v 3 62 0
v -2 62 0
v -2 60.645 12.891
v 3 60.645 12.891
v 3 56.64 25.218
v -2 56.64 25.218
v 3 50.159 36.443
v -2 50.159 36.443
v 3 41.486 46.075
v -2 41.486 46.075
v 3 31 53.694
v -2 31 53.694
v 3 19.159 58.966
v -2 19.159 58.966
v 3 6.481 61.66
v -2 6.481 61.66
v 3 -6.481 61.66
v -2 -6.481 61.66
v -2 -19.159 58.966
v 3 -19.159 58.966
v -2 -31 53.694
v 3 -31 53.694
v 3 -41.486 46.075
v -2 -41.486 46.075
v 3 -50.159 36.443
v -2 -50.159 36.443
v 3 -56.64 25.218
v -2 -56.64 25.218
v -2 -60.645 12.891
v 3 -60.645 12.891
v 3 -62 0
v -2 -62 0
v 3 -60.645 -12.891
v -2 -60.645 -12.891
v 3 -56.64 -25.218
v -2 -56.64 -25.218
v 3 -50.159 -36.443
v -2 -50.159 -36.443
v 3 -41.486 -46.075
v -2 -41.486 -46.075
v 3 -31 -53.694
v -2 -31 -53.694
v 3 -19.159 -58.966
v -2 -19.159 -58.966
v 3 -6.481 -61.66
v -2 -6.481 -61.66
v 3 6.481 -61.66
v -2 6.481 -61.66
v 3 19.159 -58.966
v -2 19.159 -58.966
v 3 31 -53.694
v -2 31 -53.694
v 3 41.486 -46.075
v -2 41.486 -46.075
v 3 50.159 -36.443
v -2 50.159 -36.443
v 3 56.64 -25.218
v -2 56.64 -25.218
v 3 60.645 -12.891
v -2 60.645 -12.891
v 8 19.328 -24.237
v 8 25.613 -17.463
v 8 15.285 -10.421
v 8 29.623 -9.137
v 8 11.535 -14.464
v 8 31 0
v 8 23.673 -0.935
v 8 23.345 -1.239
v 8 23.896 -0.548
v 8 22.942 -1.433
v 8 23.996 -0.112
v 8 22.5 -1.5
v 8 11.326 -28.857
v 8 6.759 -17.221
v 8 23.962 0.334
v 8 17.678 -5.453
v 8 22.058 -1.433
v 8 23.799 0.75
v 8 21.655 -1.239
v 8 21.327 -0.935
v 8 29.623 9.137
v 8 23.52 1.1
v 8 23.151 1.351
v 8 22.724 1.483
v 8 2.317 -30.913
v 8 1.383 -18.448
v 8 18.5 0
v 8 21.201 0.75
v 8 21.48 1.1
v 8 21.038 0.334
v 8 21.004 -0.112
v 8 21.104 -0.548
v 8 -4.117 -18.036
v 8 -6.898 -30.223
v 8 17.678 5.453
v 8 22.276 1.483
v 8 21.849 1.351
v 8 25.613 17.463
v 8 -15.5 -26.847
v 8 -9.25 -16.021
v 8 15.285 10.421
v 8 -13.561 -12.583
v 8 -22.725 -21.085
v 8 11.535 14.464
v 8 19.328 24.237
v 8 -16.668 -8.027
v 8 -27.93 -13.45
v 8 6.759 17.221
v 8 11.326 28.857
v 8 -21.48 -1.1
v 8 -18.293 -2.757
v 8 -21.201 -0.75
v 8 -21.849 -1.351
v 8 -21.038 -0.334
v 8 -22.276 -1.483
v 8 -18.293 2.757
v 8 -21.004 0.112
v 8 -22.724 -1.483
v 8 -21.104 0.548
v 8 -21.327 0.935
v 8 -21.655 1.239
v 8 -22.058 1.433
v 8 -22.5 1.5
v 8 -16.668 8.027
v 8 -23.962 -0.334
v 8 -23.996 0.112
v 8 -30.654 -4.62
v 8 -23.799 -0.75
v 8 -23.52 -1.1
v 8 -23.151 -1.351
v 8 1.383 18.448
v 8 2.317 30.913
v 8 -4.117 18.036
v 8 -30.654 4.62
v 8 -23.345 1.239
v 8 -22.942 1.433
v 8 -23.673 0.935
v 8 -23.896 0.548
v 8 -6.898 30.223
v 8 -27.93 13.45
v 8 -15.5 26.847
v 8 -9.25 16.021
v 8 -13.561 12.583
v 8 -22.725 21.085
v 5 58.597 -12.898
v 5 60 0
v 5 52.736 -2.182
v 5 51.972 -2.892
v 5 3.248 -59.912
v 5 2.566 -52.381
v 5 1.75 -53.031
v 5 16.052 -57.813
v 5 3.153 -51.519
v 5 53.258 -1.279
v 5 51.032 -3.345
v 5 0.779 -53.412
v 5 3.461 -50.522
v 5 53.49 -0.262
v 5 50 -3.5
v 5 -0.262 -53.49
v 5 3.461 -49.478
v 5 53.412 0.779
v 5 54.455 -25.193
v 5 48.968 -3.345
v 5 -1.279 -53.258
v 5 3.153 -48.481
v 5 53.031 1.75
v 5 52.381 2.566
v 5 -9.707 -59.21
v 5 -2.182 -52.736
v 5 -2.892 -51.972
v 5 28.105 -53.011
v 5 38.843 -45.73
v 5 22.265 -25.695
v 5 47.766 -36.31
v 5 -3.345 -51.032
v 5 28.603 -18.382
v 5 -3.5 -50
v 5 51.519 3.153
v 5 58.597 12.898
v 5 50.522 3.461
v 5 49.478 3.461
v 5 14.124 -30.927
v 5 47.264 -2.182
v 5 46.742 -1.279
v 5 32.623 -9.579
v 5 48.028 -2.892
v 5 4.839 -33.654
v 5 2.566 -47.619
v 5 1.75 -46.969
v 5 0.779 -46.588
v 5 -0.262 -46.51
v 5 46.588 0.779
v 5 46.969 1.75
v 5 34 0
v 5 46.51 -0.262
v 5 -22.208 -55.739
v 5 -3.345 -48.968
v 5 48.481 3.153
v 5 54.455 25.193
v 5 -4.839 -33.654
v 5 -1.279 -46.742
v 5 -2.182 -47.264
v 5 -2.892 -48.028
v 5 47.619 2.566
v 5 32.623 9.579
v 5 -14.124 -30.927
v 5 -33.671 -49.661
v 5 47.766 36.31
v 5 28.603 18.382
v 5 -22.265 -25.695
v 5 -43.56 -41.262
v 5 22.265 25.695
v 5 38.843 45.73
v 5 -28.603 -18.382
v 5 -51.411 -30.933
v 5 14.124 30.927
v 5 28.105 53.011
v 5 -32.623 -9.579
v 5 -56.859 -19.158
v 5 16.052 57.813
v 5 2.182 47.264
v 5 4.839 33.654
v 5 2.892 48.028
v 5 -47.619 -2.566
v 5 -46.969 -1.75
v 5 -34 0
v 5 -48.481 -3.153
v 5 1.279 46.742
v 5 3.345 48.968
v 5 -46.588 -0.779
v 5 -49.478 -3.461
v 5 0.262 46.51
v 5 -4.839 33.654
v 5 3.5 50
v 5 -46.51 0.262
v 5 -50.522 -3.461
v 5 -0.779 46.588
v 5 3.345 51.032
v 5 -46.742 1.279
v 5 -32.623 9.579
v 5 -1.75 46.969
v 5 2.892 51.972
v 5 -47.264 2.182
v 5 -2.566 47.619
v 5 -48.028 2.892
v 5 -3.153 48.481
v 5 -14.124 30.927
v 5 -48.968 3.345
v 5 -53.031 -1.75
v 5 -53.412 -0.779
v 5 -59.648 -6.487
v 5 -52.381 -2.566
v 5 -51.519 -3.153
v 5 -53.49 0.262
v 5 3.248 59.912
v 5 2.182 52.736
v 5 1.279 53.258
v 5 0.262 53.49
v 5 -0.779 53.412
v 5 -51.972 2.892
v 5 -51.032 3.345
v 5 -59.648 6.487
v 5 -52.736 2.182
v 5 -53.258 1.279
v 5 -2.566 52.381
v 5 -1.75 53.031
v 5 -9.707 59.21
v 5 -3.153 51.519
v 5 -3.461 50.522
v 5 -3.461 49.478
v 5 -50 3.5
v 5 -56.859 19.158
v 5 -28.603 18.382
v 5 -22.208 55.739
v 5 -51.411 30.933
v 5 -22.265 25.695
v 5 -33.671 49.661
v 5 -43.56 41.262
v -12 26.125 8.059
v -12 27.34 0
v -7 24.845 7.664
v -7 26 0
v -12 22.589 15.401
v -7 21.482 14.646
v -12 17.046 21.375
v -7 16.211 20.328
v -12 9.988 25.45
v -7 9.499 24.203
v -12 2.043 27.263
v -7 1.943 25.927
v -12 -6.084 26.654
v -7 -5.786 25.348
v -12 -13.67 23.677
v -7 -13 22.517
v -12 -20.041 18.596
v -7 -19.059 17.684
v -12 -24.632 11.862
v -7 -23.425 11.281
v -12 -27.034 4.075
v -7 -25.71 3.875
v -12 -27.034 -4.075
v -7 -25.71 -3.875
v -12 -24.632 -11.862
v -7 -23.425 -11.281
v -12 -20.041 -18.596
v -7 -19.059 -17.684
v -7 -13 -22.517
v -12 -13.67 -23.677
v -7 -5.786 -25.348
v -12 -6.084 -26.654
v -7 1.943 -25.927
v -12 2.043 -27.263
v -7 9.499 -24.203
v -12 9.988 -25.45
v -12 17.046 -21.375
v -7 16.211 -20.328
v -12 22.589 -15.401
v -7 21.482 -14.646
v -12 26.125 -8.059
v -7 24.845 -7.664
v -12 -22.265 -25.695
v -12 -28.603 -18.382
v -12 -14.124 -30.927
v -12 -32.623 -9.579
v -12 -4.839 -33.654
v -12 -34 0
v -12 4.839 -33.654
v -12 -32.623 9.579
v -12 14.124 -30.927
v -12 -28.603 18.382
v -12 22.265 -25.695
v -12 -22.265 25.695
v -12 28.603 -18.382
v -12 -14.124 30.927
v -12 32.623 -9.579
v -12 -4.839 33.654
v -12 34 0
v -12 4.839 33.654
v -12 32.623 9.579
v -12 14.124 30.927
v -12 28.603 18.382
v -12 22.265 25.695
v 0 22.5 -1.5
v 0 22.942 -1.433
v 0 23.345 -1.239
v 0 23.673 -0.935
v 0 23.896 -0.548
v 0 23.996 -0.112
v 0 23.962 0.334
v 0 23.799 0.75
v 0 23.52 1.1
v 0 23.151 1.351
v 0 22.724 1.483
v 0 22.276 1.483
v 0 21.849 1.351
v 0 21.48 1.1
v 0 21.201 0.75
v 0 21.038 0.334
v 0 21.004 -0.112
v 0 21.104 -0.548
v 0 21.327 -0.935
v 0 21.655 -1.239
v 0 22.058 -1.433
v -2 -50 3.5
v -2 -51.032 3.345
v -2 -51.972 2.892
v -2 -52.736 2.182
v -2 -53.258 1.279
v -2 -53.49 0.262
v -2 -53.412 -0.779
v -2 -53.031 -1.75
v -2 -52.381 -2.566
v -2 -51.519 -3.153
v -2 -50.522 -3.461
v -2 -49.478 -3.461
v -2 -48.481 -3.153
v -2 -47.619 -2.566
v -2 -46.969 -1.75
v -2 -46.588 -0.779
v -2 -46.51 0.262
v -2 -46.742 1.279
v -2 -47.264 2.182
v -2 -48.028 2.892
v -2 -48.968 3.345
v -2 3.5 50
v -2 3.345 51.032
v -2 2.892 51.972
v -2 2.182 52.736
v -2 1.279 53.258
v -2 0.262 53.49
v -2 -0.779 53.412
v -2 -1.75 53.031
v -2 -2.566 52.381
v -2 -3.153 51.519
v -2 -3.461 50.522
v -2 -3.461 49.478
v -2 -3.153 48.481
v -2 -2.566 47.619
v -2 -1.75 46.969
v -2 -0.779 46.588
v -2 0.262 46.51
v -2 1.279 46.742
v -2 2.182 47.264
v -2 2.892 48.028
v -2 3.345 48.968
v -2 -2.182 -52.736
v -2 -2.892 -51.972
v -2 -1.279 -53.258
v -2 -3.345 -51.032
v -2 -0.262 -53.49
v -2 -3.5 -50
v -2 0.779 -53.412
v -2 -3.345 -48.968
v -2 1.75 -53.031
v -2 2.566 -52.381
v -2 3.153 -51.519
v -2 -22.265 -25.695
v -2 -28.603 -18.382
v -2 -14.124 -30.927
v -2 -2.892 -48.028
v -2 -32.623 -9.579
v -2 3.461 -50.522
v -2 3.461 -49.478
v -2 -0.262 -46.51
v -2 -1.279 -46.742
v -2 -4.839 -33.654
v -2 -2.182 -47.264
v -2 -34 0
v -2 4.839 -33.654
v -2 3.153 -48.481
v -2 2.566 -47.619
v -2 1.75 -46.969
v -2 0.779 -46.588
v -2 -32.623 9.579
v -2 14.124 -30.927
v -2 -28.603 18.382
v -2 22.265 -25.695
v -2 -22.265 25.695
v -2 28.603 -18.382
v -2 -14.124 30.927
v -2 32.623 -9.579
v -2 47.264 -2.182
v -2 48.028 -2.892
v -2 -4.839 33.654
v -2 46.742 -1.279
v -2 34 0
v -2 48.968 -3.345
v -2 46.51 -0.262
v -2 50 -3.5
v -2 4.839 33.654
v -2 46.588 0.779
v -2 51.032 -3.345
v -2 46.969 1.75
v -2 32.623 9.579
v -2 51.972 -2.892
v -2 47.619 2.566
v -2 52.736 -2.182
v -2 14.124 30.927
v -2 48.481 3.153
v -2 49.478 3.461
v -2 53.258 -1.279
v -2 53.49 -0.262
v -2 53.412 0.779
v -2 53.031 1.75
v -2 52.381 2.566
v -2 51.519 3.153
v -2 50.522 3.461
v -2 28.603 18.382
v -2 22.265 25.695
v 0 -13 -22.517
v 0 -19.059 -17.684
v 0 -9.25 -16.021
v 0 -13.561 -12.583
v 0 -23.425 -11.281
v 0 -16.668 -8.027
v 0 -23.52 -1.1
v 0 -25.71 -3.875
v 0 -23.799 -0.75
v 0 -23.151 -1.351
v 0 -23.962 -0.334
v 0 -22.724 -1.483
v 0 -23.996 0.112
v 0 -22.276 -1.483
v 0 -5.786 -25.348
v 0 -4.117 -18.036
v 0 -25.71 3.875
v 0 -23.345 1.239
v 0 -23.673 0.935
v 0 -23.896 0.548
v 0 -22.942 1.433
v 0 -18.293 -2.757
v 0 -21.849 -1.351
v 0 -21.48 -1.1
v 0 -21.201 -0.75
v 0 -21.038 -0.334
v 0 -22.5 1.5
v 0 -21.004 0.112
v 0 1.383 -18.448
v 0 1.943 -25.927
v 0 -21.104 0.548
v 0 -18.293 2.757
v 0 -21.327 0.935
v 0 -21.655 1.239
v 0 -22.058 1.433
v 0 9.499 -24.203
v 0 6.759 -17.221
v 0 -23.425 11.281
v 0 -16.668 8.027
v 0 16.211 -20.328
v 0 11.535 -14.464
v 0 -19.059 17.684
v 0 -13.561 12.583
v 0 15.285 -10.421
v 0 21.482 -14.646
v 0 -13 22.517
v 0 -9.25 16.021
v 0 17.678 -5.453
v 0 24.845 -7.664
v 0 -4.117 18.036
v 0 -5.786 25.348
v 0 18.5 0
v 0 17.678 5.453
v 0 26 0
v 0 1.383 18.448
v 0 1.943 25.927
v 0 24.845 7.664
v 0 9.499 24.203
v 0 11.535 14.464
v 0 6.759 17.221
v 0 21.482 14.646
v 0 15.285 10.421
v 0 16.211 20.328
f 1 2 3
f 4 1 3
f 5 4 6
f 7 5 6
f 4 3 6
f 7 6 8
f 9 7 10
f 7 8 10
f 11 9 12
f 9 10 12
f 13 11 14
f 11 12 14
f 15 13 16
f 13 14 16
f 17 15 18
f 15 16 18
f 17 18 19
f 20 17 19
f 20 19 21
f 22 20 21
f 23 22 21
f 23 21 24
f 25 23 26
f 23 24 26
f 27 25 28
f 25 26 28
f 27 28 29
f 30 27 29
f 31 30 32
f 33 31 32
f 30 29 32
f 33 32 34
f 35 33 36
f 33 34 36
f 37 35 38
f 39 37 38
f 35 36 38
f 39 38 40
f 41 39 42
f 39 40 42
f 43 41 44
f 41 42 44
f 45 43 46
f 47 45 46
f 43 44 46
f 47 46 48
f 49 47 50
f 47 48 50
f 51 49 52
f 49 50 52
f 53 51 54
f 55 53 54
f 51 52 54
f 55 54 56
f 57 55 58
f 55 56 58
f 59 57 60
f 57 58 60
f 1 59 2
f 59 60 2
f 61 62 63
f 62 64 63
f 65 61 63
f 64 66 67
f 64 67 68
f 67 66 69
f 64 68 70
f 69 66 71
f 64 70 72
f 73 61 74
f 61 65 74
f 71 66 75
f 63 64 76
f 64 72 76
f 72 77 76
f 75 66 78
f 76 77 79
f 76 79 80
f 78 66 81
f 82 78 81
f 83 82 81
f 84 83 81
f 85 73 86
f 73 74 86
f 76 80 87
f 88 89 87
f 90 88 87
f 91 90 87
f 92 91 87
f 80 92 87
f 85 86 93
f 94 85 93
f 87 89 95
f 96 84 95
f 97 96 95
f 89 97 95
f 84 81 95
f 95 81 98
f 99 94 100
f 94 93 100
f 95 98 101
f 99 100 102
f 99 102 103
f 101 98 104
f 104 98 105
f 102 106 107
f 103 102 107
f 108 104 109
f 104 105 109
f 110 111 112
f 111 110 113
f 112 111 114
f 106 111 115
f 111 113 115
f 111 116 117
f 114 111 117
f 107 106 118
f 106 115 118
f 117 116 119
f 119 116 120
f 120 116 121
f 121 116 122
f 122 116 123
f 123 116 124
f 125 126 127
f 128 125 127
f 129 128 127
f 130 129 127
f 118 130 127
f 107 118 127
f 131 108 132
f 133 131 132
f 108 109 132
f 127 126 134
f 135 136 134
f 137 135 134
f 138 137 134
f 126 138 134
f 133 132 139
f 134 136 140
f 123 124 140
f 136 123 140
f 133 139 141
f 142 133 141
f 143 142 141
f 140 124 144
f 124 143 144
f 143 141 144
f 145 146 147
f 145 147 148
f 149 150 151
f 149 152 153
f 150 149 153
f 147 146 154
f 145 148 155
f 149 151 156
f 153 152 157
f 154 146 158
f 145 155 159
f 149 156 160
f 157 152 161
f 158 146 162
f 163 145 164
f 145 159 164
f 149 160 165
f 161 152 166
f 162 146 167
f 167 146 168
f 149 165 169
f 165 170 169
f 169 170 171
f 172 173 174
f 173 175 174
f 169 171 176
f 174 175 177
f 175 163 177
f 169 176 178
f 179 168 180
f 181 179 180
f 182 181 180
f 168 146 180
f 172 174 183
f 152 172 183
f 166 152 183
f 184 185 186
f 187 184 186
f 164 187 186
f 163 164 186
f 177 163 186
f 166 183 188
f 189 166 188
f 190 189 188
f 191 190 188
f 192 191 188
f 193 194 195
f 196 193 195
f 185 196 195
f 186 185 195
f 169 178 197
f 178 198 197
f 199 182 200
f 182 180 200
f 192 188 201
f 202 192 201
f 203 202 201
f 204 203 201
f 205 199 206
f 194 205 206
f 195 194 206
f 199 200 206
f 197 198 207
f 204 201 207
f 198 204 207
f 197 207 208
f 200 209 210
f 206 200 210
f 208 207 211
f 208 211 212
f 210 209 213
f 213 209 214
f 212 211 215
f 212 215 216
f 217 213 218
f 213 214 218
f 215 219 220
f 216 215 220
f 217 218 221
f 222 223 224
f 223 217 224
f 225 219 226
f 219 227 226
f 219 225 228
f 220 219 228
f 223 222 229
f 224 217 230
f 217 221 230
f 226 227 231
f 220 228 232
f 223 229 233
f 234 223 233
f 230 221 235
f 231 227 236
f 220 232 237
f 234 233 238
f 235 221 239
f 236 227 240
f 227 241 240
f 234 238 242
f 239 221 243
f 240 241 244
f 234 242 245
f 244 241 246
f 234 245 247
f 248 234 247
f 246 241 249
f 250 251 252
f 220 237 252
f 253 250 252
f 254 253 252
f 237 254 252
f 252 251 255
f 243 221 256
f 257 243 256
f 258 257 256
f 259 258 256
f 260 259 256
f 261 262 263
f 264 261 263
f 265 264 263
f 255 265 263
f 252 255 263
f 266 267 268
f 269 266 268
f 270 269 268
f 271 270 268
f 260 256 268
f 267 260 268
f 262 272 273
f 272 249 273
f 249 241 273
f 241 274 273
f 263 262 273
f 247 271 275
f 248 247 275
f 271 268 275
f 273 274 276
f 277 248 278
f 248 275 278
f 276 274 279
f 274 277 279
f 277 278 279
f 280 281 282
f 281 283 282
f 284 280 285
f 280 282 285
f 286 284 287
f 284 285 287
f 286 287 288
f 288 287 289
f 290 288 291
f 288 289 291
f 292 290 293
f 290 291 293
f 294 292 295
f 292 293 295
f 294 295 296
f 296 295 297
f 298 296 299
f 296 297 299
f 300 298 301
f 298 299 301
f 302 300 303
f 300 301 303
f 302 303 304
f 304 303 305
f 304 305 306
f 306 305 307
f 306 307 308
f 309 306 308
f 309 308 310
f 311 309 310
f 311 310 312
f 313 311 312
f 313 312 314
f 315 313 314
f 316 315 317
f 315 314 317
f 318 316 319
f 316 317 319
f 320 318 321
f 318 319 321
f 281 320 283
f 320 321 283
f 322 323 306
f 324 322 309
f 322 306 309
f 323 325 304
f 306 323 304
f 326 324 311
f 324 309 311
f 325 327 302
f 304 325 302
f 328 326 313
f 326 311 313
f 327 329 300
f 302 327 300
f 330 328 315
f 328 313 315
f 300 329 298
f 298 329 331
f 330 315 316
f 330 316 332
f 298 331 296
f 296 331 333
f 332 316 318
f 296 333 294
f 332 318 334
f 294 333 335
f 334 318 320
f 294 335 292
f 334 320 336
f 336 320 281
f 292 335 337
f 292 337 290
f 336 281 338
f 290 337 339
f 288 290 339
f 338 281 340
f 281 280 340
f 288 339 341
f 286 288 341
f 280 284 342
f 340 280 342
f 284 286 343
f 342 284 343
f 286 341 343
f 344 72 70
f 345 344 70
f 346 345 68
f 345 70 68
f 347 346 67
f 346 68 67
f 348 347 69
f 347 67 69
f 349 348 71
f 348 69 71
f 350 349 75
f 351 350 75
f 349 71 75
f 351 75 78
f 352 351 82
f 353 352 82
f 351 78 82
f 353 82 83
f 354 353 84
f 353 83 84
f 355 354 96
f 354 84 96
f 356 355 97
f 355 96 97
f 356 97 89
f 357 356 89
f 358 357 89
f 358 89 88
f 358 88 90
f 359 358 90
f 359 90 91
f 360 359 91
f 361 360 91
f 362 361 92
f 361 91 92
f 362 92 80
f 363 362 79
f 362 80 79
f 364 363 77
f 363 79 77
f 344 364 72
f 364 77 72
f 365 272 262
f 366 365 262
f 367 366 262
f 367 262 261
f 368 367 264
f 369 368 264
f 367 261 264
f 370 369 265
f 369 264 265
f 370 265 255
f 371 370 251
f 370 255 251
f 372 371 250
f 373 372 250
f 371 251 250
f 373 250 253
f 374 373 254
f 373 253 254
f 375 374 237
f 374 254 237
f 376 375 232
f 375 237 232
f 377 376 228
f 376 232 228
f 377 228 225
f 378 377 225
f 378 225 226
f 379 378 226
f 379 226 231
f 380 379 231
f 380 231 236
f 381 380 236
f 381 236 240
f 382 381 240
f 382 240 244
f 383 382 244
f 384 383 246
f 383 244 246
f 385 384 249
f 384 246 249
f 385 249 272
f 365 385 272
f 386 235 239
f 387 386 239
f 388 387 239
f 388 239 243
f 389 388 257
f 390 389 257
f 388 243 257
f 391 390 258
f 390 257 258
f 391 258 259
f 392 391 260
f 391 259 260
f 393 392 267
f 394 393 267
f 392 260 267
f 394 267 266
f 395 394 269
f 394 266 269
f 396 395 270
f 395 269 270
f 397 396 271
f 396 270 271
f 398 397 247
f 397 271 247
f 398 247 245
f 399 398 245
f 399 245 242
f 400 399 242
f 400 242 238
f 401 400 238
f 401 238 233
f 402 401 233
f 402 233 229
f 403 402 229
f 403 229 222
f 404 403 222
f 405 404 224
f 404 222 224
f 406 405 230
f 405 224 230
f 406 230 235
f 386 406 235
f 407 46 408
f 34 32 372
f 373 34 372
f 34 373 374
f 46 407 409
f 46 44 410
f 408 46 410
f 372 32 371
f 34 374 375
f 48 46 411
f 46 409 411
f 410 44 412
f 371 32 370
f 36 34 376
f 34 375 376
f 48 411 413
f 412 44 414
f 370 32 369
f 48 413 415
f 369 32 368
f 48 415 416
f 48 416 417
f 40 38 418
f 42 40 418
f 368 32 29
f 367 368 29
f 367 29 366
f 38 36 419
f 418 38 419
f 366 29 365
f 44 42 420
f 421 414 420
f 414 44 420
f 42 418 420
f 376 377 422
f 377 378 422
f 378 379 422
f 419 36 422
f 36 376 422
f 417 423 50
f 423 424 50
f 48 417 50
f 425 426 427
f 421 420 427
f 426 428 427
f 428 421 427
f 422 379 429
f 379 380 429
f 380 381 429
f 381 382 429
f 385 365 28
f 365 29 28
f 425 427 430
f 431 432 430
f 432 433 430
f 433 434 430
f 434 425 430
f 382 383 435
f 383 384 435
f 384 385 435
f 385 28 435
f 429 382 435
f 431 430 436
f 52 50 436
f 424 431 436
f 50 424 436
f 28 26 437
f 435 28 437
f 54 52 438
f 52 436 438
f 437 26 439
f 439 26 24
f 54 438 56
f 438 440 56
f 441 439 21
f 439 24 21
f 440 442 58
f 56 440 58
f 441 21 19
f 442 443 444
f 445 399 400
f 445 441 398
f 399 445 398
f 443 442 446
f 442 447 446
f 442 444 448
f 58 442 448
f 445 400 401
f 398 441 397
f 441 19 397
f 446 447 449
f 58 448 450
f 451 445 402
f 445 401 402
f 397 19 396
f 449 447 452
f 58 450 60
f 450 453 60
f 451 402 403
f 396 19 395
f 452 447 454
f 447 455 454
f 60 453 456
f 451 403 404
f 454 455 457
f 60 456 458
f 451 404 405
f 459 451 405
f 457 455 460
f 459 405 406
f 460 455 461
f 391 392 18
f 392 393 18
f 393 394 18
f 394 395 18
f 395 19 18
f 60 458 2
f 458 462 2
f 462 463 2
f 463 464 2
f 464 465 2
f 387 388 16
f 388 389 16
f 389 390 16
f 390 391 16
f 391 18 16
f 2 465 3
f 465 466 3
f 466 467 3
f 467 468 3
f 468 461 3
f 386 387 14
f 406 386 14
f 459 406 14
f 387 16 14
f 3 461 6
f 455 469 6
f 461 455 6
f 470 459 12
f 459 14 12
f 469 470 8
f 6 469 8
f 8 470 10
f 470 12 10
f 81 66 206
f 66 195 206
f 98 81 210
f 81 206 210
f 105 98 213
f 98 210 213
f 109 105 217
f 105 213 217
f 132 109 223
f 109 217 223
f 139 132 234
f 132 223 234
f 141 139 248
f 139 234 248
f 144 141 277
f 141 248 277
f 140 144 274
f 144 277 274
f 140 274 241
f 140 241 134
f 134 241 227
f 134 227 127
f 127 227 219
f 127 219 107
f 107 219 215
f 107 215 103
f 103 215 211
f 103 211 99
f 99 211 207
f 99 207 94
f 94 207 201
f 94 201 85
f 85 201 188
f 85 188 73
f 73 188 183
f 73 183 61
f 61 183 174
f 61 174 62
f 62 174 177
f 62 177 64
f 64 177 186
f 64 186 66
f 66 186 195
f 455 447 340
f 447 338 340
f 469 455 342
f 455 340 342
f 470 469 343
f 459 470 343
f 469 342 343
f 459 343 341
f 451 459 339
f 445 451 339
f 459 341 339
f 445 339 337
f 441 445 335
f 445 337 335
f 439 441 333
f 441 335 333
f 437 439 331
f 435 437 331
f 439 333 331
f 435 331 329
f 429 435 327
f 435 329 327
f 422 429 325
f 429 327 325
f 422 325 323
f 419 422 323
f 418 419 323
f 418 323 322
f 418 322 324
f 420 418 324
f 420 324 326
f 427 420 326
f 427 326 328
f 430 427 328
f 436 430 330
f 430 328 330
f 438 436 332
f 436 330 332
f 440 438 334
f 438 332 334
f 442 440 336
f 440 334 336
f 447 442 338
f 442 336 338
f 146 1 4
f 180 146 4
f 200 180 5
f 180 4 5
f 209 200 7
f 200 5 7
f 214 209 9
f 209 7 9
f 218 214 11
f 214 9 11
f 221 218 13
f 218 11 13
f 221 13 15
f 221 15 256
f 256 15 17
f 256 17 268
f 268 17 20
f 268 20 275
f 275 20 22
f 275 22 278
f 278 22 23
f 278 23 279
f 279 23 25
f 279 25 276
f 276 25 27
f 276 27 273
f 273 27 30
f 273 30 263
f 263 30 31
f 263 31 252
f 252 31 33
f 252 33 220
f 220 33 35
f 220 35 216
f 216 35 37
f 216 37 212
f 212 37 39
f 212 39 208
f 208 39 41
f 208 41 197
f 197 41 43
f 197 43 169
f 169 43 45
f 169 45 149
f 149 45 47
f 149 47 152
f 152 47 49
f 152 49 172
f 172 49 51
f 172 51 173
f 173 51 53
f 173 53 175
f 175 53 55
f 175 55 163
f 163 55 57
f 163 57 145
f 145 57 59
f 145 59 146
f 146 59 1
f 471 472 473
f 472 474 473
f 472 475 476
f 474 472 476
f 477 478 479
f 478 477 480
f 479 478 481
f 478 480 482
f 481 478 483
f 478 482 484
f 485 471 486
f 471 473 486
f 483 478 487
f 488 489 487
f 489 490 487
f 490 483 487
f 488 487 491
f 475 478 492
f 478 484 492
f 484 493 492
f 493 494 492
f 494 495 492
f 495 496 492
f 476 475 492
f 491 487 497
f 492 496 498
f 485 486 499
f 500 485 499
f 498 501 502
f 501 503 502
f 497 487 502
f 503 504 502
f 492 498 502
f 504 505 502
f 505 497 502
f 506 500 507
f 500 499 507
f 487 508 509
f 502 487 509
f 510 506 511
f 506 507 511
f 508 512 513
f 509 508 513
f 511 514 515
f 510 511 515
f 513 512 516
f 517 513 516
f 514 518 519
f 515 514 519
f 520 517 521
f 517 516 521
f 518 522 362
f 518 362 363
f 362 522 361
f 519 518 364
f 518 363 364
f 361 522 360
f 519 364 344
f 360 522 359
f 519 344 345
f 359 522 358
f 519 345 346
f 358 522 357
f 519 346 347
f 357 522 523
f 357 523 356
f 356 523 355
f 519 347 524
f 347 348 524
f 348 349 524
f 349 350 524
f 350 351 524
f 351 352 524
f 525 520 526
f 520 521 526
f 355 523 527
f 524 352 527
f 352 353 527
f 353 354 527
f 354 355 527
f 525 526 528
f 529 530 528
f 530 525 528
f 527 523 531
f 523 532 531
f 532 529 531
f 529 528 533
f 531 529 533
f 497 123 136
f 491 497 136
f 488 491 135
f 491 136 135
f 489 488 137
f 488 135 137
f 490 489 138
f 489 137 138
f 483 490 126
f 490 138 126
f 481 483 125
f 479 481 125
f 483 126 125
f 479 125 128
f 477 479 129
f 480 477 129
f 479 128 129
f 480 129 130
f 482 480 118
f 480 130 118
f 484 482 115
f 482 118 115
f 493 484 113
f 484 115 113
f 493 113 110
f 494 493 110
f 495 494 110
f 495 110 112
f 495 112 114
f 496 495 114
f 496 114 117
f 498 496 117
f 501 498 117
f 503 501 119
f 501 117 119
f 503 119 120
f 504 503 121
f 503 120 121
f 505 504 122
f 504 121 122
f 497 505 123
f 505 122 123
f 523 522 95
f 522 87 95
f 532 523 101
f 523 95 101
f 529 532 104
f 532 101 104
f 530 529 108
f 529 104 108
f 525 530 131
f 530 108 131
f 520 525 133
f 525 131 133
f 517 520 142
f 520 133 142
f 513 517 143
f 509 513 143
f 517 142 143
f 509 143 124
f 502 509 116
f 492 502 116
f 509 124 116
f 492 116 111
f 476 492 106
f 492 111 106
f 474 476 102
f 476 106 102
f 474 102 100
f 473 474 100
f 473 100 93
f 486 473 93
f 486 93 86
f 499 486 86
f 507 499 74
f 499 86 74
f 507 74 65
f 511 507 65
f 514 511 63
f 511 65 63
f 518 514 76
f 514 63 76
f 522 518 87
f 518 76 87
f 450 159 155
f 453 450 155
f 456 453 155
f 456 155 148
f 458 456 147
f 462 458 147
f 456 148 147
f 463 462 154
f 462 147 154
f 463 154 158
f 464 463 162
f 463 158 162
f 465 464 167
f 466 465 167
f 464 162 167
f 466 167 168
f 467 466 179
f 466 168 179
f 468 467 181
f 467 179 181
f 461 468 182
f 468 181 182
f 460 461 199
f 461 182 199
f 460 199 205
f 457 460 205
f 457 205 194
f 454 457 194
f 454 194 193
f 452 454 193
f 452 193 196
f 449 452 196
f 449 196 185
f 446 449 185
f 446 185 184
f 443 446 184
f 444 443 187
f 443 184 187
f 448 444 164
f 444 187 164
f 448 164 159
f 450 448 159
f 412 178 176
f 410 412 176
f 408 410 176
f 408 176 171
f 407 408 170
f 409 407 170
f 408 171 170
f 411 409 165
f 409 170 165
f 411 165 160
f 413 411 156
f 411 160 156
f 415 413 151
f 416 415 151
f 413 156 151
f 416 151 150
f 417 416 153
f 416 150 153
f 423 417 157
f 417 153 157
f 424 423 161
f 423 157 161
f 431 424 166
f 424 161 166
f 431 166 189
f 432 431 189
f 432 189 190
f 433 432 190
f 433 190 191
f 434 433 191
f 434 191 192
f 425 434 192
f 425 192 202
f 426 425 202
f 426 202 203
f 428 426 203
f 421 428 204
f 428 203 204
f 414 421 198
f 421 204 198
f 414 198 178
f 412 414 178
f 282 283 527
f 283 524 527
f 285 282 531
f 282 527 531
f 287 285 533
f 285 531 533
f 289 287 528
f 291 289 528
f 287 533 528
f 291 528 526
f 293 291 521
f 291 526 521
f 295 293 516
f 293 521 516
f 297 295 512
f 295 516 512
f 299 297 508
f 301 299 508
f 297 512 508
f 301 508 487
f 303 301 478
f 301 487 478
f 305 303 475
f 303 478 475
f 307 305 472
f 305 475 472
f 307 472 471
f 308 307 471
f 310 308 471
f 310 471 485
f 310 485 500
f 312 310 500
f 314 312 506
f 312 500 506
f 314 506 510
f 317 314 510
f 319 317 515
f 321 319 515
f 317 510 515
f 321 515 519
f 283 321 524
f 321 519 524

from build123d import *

# Parameters (mm, degrees)
ZKOSEN_1_SIZE            = 2
SKICA2_R                 = 1.5
ODEBRAT_VYSUNUT_M1_DEPTH = 8
KRUHOV_POLE1_COUNT       = 2
SKICA3_R                 = 3.5
ODEBRAT_VYSUNUT_M2_DEPTH = 7
KRUHOV_POLE2_COUNT       = 4


with BuildPart() as part:
    # Skica1 → Rotovat1 (revolve)
    with BuildSketch(Plane.XY):
        Polygon((-2, 62), (-2, 34), (-12, 34), (-12, 27.339745962), (-7, 26), (0, 26), (0, 18.5), (8, 18.5), (8, 31), (5, 34), (5, 62), align=None)
    revolve(axis=Axis((-20.777479893, 0, 0), (1, 0, 0)))

    # Zkosení1
    zkosen_1_edges = [part.edges().sort_by_distance(p)[0] for p in [
        (5, -62, 0),
    ]]
    chamfer(zkosen_1_edges, length=ZKOSEN_1_SIZE)

    # Skica2 → Odebrat vysunutím1 (cut)
    with BuildSketch(Plane(origin=(8, 0, 0), x_dir=(0, 0, -1), z_dir=(1, 0, 0))):
        with Locations((0, 22.5)):
            Circle(SKICA2_R)
    odebrat_vysunut_m1 = extrude(amount=-ODEBRAT_VYSUNUT_M1_DEPTH, mode=Mode.SUBTRACT)

    # Kruhové pole1: Odebrat vysunutím1 ×2 about axis
    kruhov_pole1_axis = Axis((0, 0, 0), (1, 0, 0))
    for i in range(1, KRUHOV_POLE1_COUNT):
        add(odebrat_vysunut_m1.rotate(kruhov_pole1_axis, i * 360 / KRUHOV_POLE1_COUNT), mode=Mode.SUBTRACT)

    # Skica3 → Odebrat vysunutím2 (cut)
    with BuildSketch(Plane(origin=(5, 0, 0), x_dir=(0, 0, -1), z_dir=(1, 0, 0))):
        with Locations((0, 50)):
            Circle(SKICA3_R)
    odebrat_vysunut_m2 = extrude(amount=-ODEBRAT_VYSUNUT_M2_DEPTH, mode=Mode.SUBTRACT)

    # Kruhové pole2: Odebrat vysunutím2 ×4 about axis
    kruhov_pole2_axis = Axis((0, 0, 0), (1, 0, 0))
    for i in range(1, KRUHOV_POLE2_COUNT):
        add(odebrat_vysunut_m2.rotate(kruhov_pole2_axis, i * 360 / KRUHOV_POLE2_COUNT), mode=Mode.SUBTRACT)


solid = part.part
